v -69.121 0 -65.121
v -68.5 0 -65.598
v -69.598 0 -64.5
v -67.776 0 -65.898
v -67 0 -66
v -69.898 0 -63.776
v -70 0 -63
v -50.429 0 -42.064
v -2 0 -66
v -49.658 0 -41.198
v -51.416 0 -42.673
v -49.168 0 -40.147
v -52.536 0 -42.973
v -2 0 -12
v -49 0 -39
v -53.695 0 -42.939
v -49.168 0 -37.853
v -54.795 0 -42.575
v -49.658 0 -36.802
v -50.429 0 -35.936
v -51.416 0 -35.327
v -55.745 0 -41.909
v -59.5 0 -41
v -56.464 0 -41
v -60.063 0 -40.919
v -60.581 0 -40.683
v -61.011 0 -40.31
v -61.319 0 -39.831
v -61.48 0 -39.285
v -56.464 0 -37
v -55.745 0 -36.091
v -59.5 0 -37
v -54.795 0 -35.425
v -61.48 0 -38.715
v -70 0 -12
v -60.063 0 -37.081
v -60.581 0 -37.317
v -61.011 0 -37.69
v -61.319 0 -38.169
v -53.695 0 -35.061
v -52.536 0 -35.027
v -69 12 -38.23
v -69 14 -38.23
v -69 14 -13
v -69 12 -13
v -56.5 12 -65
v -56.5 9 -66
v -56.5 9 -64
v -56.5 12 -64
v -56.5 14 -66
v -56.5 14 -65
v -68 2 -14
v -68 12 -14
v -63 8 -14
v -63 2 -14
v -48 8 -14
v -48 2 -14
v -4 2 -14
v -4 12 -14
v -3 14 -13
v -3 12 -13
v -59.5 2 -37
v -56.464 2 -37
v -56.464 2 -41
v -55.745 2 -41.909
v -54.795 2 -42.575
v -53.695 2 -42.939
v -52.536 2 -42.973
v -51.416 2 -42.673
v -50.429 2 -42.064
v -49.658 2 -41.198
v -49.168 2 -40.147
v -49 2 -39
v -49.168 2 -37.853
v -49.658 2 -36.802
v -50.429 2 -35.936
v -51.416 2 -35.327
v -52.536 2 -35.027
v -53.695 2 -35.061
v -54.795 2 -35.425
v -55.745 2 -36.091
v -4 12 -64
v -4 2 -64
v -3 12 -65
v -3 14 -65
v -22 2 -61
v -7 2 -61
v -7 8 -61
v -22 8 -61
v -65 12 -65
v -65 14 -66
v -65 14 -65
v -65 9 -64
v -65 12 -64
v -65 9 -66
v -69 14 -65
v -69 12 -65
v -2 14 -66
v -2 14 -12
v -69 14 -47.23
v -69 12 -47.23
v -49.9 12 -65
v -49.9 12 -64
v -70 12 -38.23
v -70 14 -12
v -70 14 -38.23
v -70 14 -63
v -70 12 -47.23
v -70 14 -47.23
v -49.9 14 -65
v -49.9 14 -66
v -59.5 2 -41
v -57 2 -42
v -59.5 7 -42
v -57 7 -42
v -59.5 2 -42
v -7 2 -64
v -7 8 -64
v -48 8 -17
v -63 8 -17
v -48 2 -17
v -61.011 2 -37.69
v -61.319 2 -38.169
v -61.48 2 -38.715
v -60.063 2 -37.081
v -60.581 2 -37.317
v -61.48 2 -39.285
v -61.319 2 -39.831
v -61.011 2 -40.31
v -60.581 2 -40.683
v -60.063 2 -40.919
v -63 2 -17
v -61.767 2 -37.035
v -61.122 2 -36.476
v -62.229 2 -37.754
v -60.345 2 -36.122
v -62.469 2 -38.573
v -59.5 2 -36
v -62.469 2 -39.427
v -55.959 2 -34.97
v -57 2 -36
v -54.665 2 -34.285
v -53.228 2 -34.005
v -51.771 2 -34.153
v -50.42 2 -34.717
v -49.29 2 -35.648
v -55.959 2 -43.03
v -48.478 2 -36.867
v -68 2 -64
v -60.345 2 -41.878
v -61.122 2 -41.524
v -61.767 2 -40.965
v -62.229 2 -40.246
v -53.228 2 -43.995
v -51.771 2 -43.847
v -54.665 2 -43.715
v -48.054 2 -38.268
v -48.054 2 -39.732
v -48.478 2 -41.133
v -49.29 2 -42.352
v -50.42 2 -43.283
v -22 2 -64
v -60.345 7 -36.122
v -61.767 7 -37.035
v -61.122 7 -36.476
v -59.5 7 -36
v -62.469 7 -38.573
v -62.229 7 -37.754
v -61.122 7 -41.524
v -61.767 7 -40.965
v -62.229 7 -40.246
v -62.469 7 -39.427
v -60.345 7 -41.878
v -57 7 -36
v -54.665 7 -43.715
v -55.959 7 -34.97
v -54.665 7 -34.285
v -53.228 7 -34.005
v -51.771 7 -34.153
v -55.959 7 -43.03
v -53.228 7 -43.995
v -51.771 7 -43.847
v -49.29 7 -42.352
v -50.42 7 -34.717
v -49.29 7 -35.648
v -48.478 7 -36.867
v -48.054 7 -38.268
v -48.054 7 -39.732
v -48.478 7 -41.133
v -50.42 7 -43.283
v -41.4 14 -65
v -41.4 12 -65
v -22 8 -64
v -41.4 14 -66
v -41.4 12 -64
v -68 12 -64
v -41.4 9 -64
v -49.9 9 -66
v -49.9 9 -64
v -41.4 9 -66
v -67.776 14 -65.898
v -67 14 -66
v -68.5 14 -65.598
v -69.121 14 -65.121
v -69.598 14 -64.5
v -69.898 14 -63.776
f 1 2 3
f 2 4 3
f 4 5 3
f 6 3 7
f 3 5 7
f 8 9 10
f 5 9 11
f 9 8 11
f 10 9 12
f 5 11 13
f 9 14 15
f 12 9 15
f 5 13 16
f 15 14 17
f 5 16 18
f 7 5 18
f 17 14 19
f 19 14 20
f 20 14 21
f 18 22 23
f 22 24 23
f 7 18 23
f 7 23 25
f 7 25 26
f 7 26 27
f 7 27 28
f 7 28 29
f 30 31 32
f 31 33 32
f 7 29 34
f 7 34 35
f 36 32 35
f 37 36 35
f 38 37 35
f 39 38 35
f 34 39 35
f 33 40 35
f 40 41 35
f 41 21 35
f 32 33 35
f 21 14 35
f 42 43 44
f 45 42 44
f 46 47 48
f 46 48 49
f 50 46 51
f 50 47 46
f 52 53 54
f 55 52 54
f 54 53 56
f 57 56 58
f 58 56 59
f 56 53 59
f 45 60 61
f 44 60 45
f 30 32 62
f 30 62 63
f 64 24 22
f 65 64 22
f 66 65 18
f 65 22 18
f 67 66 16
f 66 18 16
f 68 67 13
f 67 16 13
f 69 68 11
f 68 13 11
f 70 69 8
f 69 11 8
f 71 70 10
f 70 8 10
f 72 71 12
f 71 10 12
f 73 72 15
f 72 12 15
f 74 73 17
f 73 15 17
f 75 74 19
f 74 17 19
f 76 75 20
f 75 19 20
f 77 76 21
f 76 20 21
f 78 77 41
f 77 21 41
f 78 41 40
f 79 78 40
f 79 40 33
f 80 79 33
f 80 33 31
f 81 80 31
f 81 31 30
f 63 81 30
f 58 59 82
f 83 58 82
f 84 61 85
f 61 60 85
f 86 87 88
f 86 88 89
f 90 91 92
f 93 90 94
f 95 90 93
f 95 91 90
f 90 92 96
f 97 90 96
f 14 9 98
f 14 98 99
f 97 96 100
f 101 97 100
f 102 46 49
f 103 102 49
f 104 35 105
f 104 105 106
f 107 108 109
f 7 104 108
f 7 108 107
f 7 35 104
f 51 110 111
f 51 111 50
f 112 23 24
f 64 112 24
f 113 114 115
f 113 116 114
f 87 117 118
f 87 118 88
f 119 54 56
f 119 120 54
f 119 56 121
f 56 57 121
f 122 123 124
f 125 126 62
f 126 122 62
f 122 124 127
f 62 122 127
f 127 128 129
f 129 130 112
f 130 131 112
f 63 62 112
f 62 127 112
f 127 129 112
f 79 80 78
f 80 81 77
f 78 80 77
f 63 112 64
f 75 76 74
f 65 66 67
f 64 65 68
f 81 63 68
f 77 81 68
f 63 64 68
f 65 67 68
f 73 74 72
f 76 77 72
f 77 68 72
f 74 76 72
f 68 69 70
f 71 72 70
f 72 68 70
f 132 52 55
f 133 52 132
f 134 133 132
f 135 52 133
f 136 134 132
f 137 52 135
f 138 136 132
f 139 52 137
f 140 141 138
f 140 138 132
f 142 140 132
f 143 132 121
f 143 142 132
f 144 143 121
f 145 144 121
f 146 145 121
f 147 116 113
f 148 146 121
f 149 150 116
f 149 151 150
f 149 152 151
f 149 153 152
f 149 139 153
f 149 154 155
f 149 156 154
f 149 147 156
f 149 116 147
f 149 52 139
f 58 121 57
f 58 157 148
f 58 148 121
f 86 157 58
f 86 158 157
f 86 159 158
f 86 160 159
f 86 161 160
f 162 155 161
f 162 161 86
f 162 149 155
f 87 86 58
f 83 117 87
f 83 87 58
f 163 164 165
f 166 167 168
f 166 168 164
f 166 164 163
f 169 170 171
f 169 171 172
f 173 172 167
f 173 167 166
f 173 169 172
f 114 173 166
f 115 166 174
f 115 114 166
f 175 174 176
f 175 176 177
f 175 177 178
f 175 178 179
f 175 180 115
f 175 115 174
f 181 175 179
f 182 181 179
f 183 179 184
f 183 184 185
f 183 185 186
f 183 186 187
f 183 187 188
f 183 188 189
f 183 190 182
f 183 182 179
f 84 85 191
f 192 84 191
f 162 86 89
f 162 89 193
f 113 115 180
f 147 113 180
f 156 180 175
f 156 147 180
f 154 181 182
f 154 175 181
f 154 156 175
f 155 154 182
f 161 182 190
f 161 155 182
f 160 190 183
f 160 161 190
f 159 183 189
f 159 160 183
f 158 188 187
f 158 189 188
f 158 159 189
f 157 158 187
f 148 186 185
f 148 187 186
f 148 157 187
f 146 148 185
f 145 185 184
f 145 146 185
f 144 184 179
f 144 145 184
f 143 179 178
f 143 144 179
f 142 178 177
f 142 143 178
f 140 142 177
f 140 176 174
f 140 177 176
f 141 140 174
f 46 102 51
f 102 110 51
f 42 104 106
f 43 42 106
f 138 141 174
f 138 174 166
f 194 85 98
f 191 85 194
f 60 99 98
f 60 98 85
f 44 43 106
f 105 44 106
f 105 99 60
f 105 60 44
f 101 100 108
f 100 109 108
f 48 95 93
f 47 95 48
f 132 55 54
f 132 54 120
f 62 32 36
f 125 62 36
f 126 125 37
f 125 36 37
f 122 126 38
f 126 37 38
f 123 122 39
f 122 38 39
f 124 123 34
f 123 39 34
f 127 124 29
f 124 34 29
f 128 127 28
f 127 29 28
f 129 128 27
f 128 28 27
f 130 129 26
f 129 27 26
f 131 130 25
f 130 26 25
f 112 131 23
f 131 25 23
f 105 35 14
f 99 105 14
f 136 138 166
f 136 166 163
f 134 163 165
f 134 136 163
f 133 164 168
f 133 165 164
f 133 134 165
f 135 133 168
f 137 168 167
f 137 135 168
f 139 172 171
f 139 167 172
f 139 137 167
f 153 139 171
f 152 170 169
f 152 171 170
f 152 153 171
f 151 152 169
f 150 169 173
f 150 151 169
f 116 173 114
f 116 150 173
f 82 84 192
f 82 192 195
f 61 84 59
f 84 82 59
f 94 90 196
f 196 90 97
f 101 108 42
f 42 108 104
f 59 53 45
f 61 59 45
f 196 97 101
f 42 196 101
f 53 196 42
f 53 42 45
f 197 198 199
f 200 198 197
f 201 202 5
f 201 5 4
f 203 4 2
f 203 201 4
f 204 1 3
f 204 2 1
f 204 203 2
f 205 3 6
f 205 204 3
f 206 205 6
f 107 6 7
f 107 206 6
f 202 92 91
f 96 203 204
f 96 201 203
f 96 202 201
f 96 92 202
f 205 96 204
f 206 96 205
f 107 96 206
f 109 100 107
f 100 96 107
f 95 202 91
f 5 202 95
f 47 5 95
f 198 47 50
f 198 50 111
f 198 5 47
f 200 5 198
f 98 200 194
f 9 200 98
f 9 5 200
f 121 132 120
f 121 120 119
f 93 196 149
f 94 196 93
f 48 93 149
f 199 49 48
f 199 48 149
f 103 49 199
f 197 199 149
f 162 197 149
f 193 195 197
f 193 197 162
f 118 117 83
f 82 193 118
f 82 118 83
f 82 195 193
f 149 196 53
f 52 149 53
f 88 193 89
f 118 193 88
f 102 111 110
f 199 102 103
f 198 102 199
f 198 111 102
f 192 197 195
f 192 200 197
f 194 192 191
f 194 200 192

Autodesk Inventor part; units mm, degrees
ref_plane "YZ Plane" through (0, 0, 0) normal (1, 0, 0) x (0, 1, 0)
ref_plane "XZ Plane" through (0, 0, 0) normal (0, 1, 0) x (-1, 0, 0)
ref_plane "XY Plane" through (0, 0, 0) normal (0, 0, 1) x (1, 0, 0)
sketch "Sketch1" plane through (0, 0, 0) normal (0, 1, 0) x (-1, 0, 0)
  point P0 (0, 0)
sketch "Sketch2" plane through (0, 0, 0) normal (0, 1, 0) x (-1, 0, 0)
  line L0 (70, -12) -> (70, -66)
  line L1 (70, -66) -> (2, -66)
  line L2 (70, -12) -> (2, -12)
  line L3 (2, -66) -> (2, -12)
  point P0 (0, 0)
  point P1 (2, 0)
  dimension "d151" = 68
  dimension "d152" = 54
extrude "Extrusion1" add sketch "Sketch2" along normal blind 14
sketch "Sketch3" plane through (0, 14, 0) normal (0, 1, 0) x (1, 0, 0)
  point P0 (0, 0)
sketch "Sketch4" plane through (0, 14, 0) normal (0, 1, 0) x (1, 0, 0)
  line L0 (-2, 66) -> (-70, 66) projected
  line L1 (-30.4814, 66) -> (-28.4814, 66)
  line L2 (-28.4814, 66) -> (-28.4814, 64)
  line L3 (-70, 66) -> (-70, 12) projected
  line L4 (-70, 37.8423) -> (-70, 39.8423)
  line L5 (-70, 39.8423) -> (-68, 39.8423)
  line L6 (-68, 64) -> (-68, 14)
  line L7 (-68, 64) -> (-4, 64)
  line L8 (-68, 14) -> (-4, 14)
  line L9 (-4, 14) -> (-4, 64)
  line L10 (-70, 12) -> (-2, 12) projected
  line L11 (-2, 12) -> (-2, 66) projected
  point P0 (-2, 64)
  point P1 (-68, 12)
  dimension "d6" = 2
  dimension "d8" = 2
  dimension "d102" = 2
  dimension "d104" = 2
  dimension "d153" = 2
  dimension "d154" = 2
extrude "Extrusion2" cut sketch "Sketch4" against normal blind 12 contours L7 L9 L8 L6
sketch "Sketch10" plane through (0, 2, 0) normal (0, 1, 0) x (1, 0, 0)
  line L0 (-48, 14) -> (-48, 17)
  line L1 (-48, 14) -> (-63, 14)
  line L2 (-63, 14) -> (-63, 17)
  line L3 (-63, 17) -> (-48, 17)
  line L4 (-48, 17) -> (-48, 14)
  line L5 (-22, 64) -> (-7, 64)
  line L6 (-7, 64) -> (-7, 61)
  line L7 (-7, 61) -> (-22, 61)
  line L8 (-22, 61) -> (-22, 64)
  line L9 (-68, 64) -> (-4, 64) projected
  line L10 (-63, 14) -> (-48, 14)
  line L11 (-4, 14) -> (-68, 14) projected
  point P0 (-68, 2)
  point P1 (-2, 64)
  dimension "d55" = 3
  dimension "d56" = 15
  dimension "d60" = 15
  dimension "d108" = 3
  dimension "d155" = 0
extrude "Extrusion5" add sketch "Sketch10" along normal blind 6
sketch "Sketch12" plane through (0, 0, 0) normal (0, -1, 0) x (1, 0, 0)
  line L0 (0, 0) -> (0, -66) projected
  line L1 (-2, -12) -> (-2, -66) projected
  line L2 (-2, -66) -> (-70, -66) projected
  line L3 (-2, -66) -> (-70, -66)
  line L4 (-36, -66) -> (-36, -12)
  line L5 (-70, -66) -> (-70, -12) projected
  line L6 (-70, -66) -> (-70, -12)
  line L7 (-70, -39) -> (-2, -39)
  line L8 (-36, -39) -> (-36, -66)
  line L9 (-70, -66) -> (-36, -66)
  arc A0 (-56.4641, -41) -> (-56.4641, -37) centre (-53, -39) ccw
  line L10 (-53, -39) -> (-59.5, -39)
  arc A1 (-59.5, -37) -> (-59.5, -41) centre (-59.5, -39) ccw
  line L11 (-59.5, -41) -> (-56.4641, -41)
  line L12 (-59.5, -37) -> (-56.4641, -37)
  dimension "d158" = 8
  dimension "d159" = 6.5
  dimension "d160" = 4
extrude "Extrusion7" cut sketch "Sketch12" against normal blind 6 contours A0 L11 A1 L7 | L7 A1 L12 A0
sketch "Sketch13" plane through (0, 14, 0) normal (0, 1, 0) x (1, 0, 0)
  line L0 (-70, 66) -> (-70, 12) projected
  line L1 (-69, 65) -> (-69, 13)
  line L2 (-2, 66) -> (-70, 66) projected
  line L3 (-68, 64) -> (-4, 64)
  line L4 (-2, 64) -> (-2, 12)
  line L5 (-68, 14) -> (-68, 64)
  line L6 (-4, 14) -> (-68, 14) projected
  line L7 (-68, 14) -> (-4, 14)
  line L8 (-7, 64) -> (-4, 64) projected
  line L9 (-4, 14) -> (-4, 64)
  line L10 (-70, 12) -> (-2, 12) projected
  line L11 (-68, 13) -> (-69, 13)
  line L12 (-68, 13) -> (-3, 13)
  line L13 (-2, 12) -> (-2, 66) projected
  line L14 (-4, 13) -> (-3, 13)
  line L15 (-3, 13) -> (-3, 64)
  line L16 (-3, 64) -> (-3, 65)
  line L17 (-3, 65) -> (-69, 65)
  dimension "d96" = 1
  dimension "d99" = 1
extrude "Extrusion8" cut sketch "Sketch13" against normal blind 2 contours L17 L16 L15 L12 L11 L1 | L3 L9 L6 L5
sketch "Sketch15" plane through (-70, 0, -66) normal (-1, 0, 0) x (0, 0, 1)
  line L0 (62.4242, 8) -> (52.7396, 8)
  line L1 (0, 0) -> (66, 0) projected
  line L2 (0, 14) -> (54, 14) projected
  line L3 (0, 0) -> (0, 14) projected
  line L4 (18.77, 12) -> (27.77, 12)
  line L5 (27.77, 12) -> (27.77, 17)
  line L6 (27.77, 17) -> (18.77, 17)
  line L7 (18.77, 17) -> (18.77, 12)
  point P0 (66, 14)
  dimension "d118" = 8
  dimension "d140" = 27.77
  dimension "d141" = 9
  dimension "d143" = 5
  dimension "d150" = 4
extrude "Extrusion9" cut sketch "Sketch15" against normal blind 10
sketch "Sketch16" plane through (-2, 0, -66) normal (0, 0, -1) x (-1, 0, 0)
  line L0 (39.4, 14) -> (47.9, 14)
  line L1 (47.9, 14) -> (47.9, 9)
  line L2 (47.9, 9) -> (39.4, 9)
  line L3 (39.4, 9) -> (39.4, 14)
  line L4 (54.5, 14) -> (63, 14)
  line L5 (63, 14) -> (63, 9)
  line L6 (63, 9) -> (54.5, 9)
  line L7 (54.5, 9) -> (54.5, 14)
  line L8 (20, 8) -> (5, 8) projected
  line L9 (68, 0) -> (68, 14) projected
  point P0 (-2, 0)
  dimension "d127" = 8.5
  dimension "d128" = 8.5
  dimension "d131" = 28.6
  dimension "d132" = 13.5
  dimension "d148" = 5
  dimension "d149" = 6
extrude "Extrusion10" cut sketch "Sketch16" against normal blind 10
fillet "Fillet8" radius 3 1 edges at (-70, 7, -66)
sketch "Sketch17" plane through (0, 2, 0) normal (0, 1, 0) x (1, 0, 0)
  arc A0 (-59.5, 42) -> (-59.5, 36) centre (-59.5, 39) ccw
  line L0 (-59.5, 42) -> (-57, 42)
  arc A1 (-57, 36) -> (-57, 42) centre (-53, 39) ccw
  line L1 (-57, 36) -> (-59.5, 36)
  point P0 (0, 0)
extrude "Extrusion11" add sketch "Sketch17" along normal blind 5
properties part number "Shell 4 bottom"
